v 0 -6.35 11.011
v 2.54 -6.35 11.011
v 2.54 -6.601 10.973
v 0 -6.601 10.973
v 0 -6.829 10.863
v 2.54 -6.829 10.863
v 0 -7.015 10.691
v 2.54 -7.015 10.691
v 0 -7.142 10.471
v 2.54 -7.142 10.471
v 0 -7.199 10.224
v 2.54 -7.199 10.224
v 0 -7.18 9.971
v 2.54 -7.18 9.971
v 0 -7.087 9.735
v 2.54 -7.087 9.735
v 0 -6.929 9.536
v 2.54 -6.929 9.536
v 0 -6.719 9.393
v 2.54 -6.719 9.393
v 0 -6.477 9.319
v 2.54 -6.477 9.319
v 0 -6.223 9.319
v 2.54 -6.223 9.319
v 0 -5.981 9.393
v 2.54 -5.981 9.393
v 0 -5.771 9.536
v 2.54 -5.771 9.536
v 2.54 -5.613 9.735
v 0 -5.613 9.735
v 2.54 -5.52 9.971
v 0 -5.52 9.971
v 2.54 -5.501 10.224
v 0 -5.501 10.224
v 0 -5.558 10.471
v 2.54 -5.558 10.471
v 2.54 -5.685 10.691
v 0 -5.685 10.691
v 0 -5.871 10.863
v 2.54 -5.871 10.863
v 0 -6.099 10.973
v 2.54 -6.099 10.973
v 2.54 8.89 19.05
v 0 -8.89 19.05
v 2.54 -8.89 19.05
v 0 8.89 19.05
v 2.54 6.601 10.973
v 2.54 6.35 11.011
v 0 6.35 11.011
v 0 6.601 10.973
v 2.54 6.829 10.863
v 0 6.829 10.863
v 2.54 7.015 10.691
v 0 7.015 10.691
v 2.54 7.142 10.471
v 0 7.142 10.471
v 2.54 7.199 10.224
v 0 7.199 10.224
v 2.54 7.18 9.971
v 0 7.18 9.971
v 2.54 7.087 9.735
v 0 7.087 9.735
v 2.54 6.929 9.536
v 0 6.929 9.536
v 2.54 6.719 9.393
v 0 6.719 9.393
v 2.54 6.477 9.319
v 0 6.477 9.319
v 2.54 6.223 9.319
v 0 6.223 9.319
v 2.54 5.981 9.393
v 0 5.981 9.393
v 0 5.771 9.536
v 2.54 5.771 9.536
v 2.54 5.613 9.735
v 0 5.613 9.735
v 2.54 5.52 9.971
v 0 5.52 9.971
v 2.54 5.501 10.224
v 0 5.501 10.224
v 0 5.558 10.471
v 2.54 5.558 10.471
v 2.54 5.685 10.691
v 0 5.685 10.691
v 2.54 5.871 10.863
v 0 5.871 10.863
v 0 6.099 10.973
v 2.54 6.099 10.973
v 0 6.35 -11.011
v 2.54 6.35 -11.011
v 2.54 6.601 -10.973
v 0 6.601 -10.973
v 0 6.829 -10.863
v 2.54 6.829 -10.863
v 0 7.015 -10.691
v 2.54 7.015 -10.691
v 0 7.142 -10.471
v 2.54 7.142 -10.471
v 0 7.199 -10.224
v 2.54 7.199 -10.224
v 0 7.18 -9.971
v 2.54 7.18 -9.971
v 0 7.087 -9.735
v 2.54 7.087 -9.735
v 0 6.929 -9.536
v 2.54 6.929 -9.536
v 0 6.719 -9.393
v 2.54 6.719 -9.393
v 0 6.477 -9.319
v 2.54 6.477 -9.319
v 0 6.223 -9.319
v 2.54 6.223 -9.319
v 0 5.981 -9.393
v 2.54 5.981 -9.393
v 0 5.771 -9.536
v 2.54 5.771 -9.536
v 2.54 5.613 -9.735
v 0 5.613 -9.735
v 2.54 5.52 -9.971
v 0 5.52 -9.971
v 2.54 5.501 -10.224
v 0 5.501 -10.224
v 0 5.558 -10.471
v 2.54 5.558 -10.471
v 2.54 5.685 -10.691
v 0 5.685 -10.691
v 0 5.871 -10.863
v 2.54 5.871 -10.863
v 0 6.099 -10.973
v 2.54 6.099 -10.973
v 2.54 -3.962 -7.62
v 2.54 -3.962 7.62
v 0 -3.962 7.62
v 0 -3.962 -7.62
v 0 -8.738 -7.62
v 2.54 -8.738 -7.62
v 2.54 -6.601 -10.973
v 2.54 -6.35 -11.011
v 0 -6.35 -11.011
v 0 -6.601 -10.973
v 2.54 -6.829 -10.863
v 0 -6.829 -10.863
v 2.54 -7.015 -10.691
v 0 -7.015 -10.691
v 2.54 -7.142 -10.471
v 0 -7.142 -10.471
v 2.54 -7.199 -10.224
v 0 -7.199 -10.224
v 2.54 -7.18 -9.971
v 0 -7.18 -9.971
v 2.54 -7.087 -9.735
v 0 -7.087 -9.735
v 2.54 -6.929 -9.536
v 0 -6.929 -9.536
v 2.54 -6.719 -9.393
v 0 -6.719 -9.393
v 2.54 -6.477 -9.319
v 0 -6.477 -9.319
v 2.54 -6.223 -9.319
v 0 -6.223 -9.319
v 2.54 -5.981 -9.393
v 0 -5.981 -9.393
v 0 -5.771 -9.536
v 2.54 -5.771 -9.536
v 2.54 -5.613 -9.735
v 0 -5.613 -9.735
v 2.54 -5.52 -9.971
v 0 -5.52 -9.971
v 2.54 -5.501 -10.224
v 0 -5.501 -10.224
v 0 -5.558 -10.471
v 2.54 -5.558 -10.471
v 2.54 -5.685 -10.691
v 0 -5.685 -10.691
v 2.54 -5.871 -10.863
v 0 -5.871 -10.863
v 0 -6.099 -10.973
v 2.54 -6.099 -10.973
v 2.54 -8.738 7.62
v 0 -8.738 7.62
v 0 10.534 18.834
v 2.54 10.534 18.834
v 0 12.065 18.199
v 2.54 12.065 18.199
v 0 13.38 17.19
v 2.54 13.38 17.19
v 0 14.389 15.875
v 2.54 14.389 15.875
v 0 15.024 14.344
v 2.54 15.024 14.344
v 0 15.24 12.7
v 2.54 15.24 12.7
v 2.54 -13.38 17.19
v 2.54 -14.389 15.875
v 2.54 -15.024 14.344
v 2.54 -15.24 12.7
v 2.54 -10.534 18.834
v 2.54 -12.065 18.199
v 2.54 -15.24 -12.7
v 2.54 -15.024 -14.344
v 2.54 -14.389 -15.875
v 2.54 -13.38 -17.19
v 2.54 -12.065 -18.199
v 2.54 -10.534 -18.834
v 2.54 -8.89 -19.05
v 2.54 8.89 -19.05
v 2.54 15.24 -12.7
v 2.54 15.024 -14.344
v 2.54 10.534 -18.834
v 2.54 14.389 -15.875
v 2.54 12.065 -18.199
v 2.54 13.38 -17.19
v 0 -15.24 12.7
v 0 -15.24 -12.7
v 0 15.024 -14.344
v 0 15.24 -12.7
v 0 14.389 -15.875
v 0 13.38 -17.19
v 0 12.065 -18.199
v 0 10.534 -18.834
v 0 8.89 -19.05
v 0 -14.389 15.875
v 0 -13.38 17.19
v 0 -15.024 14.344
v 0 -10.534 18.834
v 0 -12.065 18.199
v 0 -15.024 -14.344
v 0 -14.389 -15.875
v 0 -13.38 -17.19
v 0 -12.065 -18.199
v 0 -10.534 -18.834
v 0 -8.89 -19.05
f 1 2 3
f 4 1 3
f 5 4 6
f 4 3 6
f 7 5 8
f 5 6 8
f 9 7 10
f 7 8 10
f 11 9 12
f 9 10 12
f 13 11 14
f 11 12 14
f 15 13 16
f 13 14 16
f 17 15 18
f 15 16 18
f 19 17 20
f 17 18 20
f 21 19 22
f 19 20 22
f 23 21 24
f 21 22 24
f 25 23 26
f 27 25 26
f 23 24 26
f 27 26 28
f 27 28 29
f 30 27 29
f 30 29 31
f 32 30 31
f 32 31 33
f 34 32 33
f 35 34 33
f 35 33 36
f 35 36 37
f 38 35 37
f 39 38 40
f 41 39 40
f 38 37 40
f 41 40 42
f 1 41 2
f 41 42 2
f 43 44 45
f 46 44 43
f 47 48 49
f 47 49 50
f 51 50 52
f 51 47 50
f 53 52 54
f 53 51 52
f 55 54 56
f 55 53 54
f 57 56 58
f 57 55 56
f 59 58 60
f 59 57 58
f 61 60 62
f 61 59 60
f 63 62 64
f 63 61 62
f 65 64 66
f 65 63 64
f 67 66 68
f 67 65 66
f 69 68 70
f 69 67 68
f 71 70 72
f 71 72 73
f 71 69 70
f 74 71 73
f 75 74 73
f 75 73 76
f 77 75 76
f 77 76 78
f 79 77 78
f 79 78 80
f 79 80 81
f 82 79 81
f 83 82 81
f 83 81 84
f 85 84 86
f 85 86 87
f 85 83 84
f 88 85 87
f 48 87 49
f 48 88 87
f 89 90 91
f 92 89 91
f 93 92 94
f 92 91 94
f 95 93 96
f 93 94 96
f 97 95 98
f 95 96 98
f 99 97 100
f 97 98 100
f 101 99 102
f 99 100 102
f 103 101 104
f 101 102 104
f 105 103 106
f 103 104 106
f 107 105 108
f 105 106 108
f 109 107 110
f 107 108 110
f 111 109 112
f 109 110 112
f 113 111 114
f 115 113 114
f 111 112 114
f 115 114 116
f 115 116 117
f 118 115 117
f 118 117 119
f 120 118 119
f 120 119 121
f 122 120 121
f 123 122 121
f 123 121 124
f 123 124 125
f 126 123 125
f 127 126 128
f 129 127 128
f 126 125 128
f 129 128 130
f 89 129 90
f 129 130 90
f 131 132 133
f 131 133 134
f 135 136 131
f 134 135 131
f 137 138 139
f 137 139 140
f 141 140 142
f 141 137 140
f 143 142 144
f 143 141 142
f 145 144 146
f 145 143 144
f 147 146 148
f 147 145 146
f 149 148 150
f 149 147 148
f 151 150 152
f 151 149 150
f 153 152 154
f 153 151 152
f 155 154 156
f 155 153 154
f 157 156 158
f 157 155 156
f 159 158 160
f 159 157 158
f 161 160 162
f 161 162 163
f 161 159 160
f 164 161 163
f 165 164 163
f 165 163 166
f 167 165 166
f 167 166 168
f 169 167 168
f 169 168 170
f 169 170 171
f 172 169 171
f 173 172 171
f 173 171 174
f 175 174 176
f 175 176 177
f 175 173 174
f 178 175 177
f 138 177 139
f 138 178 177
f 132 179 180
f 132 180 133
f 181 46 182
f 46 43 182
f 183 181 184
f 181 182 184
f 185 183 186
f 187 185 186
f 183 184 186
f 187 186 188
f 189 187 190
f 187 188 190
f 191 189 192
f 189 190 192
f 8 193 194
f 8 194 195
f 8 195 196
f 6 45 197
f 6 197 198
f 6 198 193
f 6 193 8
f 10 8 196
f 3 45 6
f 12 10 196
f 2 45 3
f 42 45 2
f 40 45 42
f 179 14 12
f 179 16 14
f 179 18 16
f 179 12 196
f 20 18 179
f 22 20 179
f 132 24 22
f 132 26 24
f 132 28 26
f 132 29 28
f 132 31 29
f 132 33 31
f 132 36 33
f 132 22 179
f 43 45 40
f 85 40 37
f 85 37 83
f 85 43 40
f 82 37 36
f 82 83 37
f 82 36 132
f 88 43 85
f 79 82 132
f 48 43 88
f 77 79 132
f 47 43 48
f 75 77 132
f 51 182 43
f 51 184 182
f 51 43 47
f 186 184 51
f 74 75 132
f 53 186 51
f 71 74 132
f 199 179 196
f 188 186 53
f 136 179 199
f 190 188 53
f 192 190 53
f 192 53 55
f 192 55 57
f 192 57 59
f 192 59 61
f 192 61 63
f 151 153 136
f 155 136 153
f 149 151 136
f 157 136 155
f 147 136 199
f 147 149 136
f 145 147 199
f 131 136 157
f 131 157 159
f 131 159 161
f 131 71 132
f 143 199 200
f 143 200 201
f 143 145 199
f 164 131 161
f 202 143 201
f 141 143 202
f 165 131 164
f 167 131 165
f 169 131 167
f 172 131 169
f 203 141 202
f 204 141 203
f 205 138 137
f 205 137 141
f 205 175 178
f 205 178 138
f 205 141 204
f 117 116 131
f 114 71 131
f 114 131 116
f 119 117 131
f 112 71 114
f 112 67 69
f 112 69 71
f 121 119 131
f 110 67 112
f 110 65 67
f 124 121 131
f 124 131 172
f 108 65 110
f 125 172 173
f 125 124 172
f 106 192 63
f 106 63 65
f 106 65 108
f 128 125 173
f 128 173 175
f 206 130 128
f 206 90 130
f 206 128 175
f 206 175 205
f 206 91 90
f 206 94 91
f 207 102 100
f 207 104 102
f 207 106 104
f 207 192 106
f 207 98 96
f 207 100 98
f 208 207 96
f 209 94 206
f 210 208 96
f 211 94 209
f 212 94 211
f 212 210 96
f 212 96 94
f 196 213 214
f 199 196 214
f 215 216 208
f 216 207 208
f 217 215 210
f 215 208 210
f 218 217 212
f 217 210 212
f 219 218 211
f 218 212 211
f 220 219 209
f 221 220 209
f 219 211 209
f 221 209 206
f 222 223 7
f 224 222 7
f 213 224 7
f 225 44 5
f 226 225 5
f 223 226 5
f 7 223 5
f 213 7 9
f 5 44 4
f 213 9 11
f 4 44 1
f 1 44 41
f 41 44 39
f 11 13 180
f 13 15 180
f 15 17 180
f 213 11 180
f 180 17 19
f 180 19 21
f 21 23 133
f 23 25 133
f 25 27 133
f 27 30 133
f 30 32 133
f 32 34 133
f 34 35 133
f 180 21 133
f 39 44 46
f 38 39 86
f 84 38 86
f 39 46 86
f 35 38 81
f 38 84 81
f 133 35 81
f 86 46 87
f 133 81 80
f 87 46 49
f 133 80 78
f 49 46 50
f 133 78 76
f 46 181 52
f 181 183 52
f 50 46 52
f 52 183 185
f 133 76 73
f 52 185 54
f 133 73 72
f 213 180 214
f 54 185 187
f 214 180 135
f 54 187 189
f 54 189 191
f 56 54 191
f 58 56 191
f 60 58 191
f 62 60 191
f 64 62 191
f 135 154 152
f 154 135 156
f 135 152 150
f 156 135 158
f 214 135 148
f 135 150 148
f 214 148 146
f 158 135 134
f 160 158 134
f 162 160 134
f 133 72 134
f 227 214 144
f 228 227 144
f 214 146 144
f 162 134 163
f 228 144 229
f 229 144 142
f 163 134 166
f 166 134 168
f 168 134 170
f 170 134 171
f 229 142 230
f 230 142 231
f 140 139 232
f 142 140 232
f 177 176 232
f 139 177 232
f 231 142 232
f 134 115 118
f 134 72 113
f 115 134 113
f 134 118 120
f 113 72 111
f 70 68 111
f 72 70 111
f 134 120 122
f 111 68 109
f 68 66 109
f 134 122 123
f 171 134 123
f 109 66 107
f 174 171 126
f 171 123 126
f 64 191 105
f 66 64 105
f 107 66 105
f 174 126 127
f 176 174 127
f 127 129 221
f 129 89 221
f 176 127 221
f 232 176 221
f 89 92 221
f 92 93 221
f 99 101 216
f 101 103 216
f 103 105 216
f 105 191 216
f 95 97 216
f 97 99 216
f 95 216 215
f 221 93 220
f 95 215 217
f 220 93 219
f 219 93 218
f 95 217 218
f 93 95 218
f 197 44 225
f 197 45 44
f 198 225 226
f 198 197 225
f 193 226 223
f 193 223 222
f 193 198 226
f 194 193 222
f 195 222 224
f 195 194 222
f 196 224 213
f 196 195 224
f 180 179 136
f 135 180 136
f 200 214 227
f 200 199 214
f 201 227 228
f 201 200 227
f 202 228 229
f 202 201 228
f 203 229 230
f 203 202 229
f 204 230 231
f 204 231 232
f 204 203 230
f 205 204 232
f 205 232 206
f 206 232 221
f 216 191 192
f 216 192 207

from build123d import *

# Parameters (mm, degrees)
SKETCH1_W               = 38.1
SKETCH1_H               = 30.48
BOSS_EXTRUDE1_DEPTH     = 2.54
SKETCH2_R               = 0.8509
CUT_EXTRUDE1_DEPTH      = 2.54
MIRROR2_COPY_1_SKETCH_R = 0.8509
MIRROR2_COPY_1_DEPTH    = 2.54
FILLET1_R               = 6.35
SKETCH3_W               = 15.24
SKETCH3_H               = 4.7752
CUT_EXTRUDE2_DEPTH      = 2.54


with BuildPart() as part:
    # Sketch1 → Boss-Extrude1 (new body)
    with BuildSketch(Plane(origin=(0, 0, 0), x_dir=(0, 0, -1), z_dir=(1, 0, 0))):
        Rectangle(SKETCH1_W, SKETCH1_H)
    extrude(amount=BOSS_EXTRUDE1_DEPTH)

    # Sketch2 → Cut-Extrude1 (cut)
    with BuildSketch(Plane(origin=(2.54, 0, 0), x_dir=(0, 0, -1), z_dir=(1, 0, 0))):
        with Locations((10.16, 6.35)):
            Circle(SKETCH2_R)
    cut_extrude1 = extrude(amount=-CUT_EXTRUDE1_DEPTH, mode=Mode.SUBTRACT)

    # Mirror1: Cut-Extrude1 across plane
    add(cut_extrude1.mirror(Plane.XY), mode=Mode.SUBTRACT)

    # Mirror2: Cut-Extrude1 across plane
    add(cut_extrude1.mirror(Plane.ZX), mode=Mode.SUBTRACT)

    # Mirror2 copy 1 sketch → Mirror2 copy 1 (cut)
    with BuildSketch(Plane(origin=(2.54, 0, 0), x_dir=(0, 0, 1), z_dir=(1, 0, 0))):
        with Locations((10.16, 6.35)):
            Circle(MIRROR2_COPY_1_SKETCH_R)
    extrude(amount=-MIRROR2_COPY_1_DEPTH, mode=Mode.SUBTRACT)

    # Fillet1
    fillet1_edges = [part.edges().sort_by_distance(p)[0] for p in [
        (1.27, -15.24, -19.05),
        (1.27, -15.24, 19.05),
        (1.27, 15.24, 19.05),
        (1.27, 15.24, -19.05),
    ]]
    fillet(fillet1_edges, radius=FILLET1_R)

    # Sketch3 → Cut-Extrude2 (cut)
    with BuildSketch(Plane(origin=(2.54, 0, 0), x_dir=(0, 0, -1), z_dir=(1, 0, 0))):
        with Locations((0, -6.35)):
            Rectangle(SKETCH3_W, SKETCH3_H)
    extrude(amount=-CUT_EXTRUDE2_DEPTH, mode=Mode.SUBTRACT)


solid = part.part
